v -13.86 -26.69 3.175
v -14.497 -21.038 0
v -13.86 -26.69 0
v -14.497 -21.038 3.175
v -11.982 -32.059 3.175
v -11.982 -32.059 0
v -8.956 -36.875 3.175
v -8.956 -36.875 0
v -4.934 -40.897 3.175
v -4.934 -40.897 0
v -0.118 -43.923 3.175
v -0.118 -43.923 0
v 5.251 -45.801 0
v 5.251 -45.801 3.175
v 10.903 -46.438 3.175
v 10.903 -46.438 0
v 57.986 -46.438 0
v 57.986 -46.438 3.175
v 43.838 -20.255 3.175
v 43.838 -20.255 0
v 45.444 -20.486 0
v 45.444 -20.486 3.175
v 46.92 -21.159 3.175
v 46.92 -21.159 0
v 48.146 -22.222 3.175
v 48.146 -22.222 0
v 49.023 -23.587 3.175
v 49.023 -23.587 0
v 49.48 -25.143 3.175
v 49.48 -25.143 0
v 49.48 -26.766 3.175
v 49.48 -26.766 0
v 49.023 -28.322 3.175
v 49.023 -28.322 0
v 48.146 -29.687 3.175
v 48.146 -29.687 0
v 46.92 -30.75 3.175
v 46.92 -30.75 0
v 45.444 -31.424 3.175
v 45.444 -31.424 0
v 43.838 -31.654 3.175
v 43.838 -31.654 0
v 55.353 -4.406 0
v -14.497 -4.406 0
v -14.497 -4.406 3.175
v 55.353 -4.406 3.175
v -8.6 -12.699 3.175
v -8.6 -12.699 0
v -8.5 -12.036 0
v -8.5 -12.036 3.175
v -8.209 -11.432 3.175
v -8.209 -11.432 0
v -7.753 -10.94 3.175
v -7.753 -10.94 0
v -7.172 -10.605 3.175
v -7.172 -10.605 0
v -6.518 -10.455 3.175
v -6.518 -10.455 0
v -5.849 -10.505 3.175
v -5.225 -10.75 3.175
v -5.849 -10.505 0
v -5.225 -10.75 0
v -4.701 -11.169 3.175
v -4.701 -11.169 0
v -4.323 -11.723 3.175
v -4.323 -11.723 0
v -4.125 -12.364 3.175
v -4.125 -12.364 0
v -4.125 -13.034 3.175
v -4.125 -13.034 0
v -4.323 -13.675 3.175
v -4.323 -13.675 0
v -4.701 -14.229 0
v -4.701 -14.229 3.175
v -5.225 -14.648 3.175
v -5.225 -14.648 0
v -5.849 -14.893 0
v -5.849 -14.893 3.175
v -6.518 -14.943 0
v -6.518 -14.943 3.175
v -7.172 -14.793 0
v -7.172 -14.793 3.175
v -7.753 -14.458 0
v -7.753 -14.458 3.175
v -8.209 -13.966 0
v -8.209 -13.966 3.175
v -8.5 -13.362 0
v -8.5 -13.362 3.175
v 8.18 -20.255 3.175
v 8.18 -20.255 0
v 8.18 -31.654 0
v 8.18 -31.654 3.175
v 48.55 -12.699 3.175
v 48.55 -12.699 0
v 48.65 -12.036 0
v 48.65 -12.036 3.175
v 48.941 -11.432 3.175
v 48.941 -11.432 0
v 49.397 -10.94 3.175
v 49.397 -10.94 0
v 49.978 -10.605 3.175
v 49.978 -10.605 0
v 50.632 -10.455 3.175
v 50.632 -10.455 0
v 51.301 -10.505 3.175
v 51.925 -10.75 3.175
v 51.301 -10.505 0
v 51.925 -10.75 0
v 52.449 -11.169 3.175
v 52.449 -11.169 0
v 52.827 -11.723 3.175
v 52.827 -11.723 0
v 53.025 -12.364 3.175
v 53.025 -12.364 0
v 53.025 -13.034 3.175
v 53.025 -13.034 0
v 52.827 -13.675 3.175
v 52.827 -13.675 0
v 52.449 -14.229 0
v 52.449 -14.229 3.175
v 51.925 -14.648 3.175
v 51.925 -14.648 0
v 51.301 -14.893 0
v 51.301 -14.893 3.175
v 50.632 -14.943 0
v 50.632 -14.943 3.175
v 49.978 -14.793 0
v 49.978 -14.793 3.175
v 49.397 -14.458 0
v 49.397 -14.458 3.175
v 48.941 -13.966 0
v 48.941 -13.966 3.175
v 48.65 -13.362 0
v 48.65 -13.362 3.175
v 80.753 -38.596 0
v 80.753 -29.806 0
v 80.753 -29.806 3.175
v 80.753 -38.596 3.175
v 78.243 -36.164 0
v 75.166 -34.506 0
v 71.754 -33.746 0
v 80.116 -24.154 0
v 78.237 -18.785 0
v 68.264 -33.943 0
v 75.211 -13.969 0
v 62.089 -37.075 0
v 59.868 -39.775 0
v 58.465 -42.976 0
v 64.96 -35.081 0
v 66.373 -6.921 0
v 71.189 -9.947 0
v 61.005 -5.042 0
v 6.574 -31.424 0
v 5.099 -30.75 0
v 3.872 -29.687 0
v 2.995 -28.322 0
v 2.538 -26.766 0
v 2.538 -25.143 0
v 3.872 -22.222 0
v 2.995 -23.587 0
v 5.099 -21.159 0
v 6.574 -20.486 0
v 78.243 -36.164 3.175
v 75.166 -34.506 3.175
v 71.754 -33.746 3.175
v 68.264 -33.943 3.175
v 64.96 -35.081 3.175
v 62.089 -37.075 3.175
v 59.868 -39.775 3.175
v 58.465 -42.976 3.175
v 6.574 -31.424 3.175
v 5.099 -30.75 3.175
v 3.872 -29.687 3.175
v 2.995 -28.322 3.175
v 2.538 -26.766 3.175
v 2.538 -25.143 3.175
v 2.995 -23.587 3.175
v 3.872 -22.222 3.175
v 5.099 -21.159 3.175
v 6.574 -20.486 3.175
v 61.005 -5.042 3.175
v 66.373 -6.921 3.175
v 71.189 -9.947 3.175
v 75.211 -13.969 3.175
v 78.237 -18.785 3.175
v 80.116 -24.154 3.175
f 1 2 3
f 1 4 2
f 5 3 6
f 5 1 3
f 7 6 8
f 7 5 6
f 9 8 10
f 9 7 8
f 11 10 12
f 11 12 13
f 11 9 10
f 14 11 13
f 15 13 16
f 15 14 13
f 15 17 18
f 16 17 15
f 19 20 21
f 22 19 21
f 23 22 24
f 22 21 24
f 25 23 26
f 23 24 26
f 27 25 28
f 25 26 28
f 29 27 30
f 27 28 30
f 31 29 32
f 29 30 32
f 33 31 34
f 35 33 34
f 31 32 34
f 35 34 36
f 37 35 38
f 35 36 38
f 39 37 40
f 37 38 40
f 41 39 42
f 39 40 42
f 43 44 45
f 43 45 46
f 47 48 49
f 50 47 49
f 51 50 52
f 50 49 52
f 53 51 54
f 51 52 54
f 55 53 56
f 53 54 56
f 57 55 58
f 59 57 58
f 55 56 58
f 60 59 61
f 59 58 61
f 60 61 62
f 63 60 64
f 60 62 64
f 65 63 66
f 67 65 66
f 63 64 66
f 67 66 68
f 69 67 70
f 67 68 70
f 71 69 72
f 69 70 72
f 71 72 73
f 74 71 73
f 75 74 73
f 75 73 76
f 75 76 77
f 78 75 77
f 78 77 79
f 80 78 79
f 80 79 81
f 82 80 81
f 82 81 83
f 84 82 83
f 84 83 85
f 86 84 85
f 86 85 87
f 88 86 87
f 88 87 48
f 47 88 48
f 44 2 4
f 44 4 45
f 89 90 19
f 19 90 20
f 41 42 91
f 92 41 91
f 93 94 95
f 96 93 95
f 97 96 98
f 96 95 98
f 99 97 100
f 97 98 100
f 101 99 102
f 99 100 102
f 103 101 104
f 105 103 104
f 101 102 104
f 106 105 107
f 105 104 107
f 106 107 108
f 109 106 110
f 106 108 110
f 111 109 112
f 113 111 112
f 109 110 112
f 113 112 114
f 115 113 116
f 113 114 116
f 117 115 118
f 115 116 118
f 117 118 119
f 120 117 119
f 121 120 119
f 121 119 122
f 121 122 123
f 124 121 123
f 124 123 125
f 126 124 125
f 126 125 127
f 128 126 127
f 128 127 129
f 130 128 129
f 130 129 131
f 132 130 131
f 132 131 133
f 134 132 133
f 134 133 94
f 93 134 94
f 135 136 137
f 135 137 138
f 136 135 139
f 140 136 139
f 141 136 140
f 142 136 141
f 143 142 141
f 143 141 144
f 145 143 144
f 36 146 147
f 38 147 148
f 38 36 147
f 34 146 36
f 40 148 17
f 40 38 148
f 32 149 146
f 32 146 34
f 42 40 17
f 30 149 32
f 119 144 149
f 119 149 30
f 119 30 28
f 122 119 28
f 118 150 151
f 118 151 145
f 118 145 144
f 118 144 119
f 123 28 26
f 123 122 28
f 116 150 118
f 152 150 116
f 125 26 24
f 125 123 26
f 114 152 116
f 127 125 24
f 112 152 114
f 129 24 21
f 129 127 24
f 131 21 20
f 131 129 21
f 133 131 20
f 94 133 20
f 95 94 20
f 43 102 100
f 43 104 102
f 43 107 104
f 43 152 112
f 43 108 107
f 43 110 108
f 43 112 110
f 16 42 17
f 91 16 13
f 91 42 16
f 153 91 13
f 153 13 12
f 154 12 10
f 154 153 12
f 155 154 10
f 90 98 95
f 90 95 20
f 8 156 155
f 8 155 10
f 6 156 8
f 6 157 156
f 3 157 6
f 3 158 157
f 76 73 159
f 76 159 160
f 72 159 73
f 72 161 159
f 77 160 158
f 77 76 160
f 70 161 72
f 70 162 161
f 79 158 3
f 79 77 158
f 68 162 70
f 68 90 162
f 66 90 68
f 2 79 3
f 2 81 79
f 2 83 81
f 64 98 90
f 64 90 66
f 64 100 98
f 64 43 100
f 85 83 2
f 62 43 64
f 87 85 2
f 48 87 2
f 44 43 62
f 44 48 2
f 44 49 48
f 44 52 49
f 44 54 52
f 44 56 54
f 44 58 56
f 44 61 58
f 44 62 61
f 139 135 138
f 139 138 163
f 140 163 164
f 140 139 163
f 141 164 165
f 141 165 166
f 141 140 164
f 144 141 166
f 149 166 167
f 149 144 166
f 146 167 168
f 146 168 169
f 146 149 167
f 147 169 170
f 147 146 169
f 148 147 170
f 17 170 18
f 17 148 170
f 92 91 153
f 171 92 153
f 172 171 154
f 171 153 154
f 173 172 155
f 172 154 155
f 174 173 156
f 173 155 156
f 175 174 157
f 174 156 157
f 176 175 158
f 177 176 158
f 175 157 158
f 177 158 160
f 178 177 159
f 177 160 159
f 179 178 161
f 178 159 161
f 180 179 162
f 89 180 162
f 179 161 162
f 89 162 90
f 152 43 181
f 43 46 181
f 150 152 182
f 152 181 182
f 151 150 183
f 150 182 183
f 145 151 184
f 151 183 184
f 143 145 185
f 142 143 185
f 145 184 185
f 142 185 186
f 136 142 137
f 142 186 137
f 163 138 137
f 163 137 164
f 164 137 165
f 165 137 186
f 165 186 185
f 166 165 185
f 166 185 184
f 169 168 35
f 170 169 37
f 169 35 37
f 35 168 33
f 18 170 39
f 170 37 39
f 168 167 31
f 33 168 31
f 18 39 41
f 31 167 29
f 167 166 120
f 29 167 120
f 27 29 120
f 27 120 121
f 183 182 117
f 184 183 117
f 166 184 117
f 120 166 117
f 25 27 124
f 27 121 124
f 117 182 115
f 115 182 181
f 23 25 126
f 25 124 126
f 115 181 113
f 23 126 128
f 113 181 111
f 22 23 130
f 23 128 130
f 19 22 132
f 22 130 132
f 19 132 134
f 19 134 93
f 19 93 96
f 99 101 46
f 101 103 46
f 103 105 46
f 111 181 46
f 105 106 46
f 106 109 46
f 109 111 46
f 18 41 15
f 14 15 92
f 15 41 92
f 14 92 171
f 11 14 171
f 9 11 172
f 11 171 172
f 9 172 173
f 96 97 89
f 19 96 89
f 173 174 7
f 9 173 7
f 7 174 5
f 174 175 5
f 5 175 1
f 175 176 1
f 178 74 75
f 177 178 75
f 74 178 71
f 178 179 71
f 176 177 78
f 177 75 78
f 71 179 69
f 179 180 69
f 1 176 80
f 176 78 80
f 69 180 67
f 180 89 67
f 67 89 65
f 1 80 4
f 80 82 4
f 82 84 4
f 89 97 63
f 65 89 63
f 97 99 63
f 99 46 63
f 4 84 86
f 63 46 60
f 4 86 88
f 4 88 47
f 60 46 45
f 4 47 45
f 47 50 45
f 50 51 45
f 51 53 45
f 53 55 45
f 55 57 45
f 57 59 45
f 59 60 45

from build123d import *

# Parameters (mm, degrees)
BOSS_EXTRUDE1_DEPTH = 3.175
FILLET1_R           = 25.4
SKETCH2_R           = 2.25
CUT_EXTRUDE1_DEPTH  = 94.20730796


with BuildPart() as part:
    # Sketch1 → Boss-Extrude1 (new body)
    with BuildSketch(Plane.XY):
        with BuildLine():
            Line((-14.497184722, -4.405622253), (80.752815278, -4.405622253))
            Line((80.752815278, -4.405622253), (80.752815278, -38.596437465))
            ThreePointArc((80.752815278, -38.596437465), (66.572735919, -34.398241716), (57.985570414, -46.438178872))
            Line((57.985570414, -46.438178872), (-14.497184722, -46.438178872))
            Line((-14.497184722, -46.438178872), (-14.497184722, -4.405622253))
        make_face()
        with BuildLine():
            Line((8.180129042, -20.254648783), (43.838119696, -20.254648783))
            ThreePointArc((43.838119696, -20.254648783), (49.538039085, -25.954568173), (43.838119696, -31.654487563))
            Line((43.838119696, -31.654487563), (8.180129042, -31.654487563))
            ThreePointArc((8.180129042, -31.654487563), (2.480209652, -25.954568173), (8.180129042, -20.254648783))
        make_face(mode=Mode.SUBTRACT)
    extrude(amount=BOSS_EXTRUDE1_DEPTH)

    # Fillet1
    fillet1_edges = [part.edges().sort_by_distance(p)[0] for p in [
        (80.752815278, -4.405622253, 1.5875),
        (-14.497184722, -46.438178872, 1.5875),
    ]]
    fillet(fillet1_edges, radius=FILLET1_R)

    # Sketch2 → Cut-Extrude1 (cut, through all)
    with BuildSketch(Plane(origin=(0, 0, 0), x_dir=(-1, 0, 0), z_dir=(0, 0, -1))):
        with Locations((-50.8, -12.699000033)):
            Circle(SKETCH2_R)
        with Locations((6.35, -12.699000033)):
            Circle(SKETCH2_R)
    extrude(amount=-CUT_EXTRUDE1_DEPTH, mode=Mode.SUBTRACT)


solid = part.part
